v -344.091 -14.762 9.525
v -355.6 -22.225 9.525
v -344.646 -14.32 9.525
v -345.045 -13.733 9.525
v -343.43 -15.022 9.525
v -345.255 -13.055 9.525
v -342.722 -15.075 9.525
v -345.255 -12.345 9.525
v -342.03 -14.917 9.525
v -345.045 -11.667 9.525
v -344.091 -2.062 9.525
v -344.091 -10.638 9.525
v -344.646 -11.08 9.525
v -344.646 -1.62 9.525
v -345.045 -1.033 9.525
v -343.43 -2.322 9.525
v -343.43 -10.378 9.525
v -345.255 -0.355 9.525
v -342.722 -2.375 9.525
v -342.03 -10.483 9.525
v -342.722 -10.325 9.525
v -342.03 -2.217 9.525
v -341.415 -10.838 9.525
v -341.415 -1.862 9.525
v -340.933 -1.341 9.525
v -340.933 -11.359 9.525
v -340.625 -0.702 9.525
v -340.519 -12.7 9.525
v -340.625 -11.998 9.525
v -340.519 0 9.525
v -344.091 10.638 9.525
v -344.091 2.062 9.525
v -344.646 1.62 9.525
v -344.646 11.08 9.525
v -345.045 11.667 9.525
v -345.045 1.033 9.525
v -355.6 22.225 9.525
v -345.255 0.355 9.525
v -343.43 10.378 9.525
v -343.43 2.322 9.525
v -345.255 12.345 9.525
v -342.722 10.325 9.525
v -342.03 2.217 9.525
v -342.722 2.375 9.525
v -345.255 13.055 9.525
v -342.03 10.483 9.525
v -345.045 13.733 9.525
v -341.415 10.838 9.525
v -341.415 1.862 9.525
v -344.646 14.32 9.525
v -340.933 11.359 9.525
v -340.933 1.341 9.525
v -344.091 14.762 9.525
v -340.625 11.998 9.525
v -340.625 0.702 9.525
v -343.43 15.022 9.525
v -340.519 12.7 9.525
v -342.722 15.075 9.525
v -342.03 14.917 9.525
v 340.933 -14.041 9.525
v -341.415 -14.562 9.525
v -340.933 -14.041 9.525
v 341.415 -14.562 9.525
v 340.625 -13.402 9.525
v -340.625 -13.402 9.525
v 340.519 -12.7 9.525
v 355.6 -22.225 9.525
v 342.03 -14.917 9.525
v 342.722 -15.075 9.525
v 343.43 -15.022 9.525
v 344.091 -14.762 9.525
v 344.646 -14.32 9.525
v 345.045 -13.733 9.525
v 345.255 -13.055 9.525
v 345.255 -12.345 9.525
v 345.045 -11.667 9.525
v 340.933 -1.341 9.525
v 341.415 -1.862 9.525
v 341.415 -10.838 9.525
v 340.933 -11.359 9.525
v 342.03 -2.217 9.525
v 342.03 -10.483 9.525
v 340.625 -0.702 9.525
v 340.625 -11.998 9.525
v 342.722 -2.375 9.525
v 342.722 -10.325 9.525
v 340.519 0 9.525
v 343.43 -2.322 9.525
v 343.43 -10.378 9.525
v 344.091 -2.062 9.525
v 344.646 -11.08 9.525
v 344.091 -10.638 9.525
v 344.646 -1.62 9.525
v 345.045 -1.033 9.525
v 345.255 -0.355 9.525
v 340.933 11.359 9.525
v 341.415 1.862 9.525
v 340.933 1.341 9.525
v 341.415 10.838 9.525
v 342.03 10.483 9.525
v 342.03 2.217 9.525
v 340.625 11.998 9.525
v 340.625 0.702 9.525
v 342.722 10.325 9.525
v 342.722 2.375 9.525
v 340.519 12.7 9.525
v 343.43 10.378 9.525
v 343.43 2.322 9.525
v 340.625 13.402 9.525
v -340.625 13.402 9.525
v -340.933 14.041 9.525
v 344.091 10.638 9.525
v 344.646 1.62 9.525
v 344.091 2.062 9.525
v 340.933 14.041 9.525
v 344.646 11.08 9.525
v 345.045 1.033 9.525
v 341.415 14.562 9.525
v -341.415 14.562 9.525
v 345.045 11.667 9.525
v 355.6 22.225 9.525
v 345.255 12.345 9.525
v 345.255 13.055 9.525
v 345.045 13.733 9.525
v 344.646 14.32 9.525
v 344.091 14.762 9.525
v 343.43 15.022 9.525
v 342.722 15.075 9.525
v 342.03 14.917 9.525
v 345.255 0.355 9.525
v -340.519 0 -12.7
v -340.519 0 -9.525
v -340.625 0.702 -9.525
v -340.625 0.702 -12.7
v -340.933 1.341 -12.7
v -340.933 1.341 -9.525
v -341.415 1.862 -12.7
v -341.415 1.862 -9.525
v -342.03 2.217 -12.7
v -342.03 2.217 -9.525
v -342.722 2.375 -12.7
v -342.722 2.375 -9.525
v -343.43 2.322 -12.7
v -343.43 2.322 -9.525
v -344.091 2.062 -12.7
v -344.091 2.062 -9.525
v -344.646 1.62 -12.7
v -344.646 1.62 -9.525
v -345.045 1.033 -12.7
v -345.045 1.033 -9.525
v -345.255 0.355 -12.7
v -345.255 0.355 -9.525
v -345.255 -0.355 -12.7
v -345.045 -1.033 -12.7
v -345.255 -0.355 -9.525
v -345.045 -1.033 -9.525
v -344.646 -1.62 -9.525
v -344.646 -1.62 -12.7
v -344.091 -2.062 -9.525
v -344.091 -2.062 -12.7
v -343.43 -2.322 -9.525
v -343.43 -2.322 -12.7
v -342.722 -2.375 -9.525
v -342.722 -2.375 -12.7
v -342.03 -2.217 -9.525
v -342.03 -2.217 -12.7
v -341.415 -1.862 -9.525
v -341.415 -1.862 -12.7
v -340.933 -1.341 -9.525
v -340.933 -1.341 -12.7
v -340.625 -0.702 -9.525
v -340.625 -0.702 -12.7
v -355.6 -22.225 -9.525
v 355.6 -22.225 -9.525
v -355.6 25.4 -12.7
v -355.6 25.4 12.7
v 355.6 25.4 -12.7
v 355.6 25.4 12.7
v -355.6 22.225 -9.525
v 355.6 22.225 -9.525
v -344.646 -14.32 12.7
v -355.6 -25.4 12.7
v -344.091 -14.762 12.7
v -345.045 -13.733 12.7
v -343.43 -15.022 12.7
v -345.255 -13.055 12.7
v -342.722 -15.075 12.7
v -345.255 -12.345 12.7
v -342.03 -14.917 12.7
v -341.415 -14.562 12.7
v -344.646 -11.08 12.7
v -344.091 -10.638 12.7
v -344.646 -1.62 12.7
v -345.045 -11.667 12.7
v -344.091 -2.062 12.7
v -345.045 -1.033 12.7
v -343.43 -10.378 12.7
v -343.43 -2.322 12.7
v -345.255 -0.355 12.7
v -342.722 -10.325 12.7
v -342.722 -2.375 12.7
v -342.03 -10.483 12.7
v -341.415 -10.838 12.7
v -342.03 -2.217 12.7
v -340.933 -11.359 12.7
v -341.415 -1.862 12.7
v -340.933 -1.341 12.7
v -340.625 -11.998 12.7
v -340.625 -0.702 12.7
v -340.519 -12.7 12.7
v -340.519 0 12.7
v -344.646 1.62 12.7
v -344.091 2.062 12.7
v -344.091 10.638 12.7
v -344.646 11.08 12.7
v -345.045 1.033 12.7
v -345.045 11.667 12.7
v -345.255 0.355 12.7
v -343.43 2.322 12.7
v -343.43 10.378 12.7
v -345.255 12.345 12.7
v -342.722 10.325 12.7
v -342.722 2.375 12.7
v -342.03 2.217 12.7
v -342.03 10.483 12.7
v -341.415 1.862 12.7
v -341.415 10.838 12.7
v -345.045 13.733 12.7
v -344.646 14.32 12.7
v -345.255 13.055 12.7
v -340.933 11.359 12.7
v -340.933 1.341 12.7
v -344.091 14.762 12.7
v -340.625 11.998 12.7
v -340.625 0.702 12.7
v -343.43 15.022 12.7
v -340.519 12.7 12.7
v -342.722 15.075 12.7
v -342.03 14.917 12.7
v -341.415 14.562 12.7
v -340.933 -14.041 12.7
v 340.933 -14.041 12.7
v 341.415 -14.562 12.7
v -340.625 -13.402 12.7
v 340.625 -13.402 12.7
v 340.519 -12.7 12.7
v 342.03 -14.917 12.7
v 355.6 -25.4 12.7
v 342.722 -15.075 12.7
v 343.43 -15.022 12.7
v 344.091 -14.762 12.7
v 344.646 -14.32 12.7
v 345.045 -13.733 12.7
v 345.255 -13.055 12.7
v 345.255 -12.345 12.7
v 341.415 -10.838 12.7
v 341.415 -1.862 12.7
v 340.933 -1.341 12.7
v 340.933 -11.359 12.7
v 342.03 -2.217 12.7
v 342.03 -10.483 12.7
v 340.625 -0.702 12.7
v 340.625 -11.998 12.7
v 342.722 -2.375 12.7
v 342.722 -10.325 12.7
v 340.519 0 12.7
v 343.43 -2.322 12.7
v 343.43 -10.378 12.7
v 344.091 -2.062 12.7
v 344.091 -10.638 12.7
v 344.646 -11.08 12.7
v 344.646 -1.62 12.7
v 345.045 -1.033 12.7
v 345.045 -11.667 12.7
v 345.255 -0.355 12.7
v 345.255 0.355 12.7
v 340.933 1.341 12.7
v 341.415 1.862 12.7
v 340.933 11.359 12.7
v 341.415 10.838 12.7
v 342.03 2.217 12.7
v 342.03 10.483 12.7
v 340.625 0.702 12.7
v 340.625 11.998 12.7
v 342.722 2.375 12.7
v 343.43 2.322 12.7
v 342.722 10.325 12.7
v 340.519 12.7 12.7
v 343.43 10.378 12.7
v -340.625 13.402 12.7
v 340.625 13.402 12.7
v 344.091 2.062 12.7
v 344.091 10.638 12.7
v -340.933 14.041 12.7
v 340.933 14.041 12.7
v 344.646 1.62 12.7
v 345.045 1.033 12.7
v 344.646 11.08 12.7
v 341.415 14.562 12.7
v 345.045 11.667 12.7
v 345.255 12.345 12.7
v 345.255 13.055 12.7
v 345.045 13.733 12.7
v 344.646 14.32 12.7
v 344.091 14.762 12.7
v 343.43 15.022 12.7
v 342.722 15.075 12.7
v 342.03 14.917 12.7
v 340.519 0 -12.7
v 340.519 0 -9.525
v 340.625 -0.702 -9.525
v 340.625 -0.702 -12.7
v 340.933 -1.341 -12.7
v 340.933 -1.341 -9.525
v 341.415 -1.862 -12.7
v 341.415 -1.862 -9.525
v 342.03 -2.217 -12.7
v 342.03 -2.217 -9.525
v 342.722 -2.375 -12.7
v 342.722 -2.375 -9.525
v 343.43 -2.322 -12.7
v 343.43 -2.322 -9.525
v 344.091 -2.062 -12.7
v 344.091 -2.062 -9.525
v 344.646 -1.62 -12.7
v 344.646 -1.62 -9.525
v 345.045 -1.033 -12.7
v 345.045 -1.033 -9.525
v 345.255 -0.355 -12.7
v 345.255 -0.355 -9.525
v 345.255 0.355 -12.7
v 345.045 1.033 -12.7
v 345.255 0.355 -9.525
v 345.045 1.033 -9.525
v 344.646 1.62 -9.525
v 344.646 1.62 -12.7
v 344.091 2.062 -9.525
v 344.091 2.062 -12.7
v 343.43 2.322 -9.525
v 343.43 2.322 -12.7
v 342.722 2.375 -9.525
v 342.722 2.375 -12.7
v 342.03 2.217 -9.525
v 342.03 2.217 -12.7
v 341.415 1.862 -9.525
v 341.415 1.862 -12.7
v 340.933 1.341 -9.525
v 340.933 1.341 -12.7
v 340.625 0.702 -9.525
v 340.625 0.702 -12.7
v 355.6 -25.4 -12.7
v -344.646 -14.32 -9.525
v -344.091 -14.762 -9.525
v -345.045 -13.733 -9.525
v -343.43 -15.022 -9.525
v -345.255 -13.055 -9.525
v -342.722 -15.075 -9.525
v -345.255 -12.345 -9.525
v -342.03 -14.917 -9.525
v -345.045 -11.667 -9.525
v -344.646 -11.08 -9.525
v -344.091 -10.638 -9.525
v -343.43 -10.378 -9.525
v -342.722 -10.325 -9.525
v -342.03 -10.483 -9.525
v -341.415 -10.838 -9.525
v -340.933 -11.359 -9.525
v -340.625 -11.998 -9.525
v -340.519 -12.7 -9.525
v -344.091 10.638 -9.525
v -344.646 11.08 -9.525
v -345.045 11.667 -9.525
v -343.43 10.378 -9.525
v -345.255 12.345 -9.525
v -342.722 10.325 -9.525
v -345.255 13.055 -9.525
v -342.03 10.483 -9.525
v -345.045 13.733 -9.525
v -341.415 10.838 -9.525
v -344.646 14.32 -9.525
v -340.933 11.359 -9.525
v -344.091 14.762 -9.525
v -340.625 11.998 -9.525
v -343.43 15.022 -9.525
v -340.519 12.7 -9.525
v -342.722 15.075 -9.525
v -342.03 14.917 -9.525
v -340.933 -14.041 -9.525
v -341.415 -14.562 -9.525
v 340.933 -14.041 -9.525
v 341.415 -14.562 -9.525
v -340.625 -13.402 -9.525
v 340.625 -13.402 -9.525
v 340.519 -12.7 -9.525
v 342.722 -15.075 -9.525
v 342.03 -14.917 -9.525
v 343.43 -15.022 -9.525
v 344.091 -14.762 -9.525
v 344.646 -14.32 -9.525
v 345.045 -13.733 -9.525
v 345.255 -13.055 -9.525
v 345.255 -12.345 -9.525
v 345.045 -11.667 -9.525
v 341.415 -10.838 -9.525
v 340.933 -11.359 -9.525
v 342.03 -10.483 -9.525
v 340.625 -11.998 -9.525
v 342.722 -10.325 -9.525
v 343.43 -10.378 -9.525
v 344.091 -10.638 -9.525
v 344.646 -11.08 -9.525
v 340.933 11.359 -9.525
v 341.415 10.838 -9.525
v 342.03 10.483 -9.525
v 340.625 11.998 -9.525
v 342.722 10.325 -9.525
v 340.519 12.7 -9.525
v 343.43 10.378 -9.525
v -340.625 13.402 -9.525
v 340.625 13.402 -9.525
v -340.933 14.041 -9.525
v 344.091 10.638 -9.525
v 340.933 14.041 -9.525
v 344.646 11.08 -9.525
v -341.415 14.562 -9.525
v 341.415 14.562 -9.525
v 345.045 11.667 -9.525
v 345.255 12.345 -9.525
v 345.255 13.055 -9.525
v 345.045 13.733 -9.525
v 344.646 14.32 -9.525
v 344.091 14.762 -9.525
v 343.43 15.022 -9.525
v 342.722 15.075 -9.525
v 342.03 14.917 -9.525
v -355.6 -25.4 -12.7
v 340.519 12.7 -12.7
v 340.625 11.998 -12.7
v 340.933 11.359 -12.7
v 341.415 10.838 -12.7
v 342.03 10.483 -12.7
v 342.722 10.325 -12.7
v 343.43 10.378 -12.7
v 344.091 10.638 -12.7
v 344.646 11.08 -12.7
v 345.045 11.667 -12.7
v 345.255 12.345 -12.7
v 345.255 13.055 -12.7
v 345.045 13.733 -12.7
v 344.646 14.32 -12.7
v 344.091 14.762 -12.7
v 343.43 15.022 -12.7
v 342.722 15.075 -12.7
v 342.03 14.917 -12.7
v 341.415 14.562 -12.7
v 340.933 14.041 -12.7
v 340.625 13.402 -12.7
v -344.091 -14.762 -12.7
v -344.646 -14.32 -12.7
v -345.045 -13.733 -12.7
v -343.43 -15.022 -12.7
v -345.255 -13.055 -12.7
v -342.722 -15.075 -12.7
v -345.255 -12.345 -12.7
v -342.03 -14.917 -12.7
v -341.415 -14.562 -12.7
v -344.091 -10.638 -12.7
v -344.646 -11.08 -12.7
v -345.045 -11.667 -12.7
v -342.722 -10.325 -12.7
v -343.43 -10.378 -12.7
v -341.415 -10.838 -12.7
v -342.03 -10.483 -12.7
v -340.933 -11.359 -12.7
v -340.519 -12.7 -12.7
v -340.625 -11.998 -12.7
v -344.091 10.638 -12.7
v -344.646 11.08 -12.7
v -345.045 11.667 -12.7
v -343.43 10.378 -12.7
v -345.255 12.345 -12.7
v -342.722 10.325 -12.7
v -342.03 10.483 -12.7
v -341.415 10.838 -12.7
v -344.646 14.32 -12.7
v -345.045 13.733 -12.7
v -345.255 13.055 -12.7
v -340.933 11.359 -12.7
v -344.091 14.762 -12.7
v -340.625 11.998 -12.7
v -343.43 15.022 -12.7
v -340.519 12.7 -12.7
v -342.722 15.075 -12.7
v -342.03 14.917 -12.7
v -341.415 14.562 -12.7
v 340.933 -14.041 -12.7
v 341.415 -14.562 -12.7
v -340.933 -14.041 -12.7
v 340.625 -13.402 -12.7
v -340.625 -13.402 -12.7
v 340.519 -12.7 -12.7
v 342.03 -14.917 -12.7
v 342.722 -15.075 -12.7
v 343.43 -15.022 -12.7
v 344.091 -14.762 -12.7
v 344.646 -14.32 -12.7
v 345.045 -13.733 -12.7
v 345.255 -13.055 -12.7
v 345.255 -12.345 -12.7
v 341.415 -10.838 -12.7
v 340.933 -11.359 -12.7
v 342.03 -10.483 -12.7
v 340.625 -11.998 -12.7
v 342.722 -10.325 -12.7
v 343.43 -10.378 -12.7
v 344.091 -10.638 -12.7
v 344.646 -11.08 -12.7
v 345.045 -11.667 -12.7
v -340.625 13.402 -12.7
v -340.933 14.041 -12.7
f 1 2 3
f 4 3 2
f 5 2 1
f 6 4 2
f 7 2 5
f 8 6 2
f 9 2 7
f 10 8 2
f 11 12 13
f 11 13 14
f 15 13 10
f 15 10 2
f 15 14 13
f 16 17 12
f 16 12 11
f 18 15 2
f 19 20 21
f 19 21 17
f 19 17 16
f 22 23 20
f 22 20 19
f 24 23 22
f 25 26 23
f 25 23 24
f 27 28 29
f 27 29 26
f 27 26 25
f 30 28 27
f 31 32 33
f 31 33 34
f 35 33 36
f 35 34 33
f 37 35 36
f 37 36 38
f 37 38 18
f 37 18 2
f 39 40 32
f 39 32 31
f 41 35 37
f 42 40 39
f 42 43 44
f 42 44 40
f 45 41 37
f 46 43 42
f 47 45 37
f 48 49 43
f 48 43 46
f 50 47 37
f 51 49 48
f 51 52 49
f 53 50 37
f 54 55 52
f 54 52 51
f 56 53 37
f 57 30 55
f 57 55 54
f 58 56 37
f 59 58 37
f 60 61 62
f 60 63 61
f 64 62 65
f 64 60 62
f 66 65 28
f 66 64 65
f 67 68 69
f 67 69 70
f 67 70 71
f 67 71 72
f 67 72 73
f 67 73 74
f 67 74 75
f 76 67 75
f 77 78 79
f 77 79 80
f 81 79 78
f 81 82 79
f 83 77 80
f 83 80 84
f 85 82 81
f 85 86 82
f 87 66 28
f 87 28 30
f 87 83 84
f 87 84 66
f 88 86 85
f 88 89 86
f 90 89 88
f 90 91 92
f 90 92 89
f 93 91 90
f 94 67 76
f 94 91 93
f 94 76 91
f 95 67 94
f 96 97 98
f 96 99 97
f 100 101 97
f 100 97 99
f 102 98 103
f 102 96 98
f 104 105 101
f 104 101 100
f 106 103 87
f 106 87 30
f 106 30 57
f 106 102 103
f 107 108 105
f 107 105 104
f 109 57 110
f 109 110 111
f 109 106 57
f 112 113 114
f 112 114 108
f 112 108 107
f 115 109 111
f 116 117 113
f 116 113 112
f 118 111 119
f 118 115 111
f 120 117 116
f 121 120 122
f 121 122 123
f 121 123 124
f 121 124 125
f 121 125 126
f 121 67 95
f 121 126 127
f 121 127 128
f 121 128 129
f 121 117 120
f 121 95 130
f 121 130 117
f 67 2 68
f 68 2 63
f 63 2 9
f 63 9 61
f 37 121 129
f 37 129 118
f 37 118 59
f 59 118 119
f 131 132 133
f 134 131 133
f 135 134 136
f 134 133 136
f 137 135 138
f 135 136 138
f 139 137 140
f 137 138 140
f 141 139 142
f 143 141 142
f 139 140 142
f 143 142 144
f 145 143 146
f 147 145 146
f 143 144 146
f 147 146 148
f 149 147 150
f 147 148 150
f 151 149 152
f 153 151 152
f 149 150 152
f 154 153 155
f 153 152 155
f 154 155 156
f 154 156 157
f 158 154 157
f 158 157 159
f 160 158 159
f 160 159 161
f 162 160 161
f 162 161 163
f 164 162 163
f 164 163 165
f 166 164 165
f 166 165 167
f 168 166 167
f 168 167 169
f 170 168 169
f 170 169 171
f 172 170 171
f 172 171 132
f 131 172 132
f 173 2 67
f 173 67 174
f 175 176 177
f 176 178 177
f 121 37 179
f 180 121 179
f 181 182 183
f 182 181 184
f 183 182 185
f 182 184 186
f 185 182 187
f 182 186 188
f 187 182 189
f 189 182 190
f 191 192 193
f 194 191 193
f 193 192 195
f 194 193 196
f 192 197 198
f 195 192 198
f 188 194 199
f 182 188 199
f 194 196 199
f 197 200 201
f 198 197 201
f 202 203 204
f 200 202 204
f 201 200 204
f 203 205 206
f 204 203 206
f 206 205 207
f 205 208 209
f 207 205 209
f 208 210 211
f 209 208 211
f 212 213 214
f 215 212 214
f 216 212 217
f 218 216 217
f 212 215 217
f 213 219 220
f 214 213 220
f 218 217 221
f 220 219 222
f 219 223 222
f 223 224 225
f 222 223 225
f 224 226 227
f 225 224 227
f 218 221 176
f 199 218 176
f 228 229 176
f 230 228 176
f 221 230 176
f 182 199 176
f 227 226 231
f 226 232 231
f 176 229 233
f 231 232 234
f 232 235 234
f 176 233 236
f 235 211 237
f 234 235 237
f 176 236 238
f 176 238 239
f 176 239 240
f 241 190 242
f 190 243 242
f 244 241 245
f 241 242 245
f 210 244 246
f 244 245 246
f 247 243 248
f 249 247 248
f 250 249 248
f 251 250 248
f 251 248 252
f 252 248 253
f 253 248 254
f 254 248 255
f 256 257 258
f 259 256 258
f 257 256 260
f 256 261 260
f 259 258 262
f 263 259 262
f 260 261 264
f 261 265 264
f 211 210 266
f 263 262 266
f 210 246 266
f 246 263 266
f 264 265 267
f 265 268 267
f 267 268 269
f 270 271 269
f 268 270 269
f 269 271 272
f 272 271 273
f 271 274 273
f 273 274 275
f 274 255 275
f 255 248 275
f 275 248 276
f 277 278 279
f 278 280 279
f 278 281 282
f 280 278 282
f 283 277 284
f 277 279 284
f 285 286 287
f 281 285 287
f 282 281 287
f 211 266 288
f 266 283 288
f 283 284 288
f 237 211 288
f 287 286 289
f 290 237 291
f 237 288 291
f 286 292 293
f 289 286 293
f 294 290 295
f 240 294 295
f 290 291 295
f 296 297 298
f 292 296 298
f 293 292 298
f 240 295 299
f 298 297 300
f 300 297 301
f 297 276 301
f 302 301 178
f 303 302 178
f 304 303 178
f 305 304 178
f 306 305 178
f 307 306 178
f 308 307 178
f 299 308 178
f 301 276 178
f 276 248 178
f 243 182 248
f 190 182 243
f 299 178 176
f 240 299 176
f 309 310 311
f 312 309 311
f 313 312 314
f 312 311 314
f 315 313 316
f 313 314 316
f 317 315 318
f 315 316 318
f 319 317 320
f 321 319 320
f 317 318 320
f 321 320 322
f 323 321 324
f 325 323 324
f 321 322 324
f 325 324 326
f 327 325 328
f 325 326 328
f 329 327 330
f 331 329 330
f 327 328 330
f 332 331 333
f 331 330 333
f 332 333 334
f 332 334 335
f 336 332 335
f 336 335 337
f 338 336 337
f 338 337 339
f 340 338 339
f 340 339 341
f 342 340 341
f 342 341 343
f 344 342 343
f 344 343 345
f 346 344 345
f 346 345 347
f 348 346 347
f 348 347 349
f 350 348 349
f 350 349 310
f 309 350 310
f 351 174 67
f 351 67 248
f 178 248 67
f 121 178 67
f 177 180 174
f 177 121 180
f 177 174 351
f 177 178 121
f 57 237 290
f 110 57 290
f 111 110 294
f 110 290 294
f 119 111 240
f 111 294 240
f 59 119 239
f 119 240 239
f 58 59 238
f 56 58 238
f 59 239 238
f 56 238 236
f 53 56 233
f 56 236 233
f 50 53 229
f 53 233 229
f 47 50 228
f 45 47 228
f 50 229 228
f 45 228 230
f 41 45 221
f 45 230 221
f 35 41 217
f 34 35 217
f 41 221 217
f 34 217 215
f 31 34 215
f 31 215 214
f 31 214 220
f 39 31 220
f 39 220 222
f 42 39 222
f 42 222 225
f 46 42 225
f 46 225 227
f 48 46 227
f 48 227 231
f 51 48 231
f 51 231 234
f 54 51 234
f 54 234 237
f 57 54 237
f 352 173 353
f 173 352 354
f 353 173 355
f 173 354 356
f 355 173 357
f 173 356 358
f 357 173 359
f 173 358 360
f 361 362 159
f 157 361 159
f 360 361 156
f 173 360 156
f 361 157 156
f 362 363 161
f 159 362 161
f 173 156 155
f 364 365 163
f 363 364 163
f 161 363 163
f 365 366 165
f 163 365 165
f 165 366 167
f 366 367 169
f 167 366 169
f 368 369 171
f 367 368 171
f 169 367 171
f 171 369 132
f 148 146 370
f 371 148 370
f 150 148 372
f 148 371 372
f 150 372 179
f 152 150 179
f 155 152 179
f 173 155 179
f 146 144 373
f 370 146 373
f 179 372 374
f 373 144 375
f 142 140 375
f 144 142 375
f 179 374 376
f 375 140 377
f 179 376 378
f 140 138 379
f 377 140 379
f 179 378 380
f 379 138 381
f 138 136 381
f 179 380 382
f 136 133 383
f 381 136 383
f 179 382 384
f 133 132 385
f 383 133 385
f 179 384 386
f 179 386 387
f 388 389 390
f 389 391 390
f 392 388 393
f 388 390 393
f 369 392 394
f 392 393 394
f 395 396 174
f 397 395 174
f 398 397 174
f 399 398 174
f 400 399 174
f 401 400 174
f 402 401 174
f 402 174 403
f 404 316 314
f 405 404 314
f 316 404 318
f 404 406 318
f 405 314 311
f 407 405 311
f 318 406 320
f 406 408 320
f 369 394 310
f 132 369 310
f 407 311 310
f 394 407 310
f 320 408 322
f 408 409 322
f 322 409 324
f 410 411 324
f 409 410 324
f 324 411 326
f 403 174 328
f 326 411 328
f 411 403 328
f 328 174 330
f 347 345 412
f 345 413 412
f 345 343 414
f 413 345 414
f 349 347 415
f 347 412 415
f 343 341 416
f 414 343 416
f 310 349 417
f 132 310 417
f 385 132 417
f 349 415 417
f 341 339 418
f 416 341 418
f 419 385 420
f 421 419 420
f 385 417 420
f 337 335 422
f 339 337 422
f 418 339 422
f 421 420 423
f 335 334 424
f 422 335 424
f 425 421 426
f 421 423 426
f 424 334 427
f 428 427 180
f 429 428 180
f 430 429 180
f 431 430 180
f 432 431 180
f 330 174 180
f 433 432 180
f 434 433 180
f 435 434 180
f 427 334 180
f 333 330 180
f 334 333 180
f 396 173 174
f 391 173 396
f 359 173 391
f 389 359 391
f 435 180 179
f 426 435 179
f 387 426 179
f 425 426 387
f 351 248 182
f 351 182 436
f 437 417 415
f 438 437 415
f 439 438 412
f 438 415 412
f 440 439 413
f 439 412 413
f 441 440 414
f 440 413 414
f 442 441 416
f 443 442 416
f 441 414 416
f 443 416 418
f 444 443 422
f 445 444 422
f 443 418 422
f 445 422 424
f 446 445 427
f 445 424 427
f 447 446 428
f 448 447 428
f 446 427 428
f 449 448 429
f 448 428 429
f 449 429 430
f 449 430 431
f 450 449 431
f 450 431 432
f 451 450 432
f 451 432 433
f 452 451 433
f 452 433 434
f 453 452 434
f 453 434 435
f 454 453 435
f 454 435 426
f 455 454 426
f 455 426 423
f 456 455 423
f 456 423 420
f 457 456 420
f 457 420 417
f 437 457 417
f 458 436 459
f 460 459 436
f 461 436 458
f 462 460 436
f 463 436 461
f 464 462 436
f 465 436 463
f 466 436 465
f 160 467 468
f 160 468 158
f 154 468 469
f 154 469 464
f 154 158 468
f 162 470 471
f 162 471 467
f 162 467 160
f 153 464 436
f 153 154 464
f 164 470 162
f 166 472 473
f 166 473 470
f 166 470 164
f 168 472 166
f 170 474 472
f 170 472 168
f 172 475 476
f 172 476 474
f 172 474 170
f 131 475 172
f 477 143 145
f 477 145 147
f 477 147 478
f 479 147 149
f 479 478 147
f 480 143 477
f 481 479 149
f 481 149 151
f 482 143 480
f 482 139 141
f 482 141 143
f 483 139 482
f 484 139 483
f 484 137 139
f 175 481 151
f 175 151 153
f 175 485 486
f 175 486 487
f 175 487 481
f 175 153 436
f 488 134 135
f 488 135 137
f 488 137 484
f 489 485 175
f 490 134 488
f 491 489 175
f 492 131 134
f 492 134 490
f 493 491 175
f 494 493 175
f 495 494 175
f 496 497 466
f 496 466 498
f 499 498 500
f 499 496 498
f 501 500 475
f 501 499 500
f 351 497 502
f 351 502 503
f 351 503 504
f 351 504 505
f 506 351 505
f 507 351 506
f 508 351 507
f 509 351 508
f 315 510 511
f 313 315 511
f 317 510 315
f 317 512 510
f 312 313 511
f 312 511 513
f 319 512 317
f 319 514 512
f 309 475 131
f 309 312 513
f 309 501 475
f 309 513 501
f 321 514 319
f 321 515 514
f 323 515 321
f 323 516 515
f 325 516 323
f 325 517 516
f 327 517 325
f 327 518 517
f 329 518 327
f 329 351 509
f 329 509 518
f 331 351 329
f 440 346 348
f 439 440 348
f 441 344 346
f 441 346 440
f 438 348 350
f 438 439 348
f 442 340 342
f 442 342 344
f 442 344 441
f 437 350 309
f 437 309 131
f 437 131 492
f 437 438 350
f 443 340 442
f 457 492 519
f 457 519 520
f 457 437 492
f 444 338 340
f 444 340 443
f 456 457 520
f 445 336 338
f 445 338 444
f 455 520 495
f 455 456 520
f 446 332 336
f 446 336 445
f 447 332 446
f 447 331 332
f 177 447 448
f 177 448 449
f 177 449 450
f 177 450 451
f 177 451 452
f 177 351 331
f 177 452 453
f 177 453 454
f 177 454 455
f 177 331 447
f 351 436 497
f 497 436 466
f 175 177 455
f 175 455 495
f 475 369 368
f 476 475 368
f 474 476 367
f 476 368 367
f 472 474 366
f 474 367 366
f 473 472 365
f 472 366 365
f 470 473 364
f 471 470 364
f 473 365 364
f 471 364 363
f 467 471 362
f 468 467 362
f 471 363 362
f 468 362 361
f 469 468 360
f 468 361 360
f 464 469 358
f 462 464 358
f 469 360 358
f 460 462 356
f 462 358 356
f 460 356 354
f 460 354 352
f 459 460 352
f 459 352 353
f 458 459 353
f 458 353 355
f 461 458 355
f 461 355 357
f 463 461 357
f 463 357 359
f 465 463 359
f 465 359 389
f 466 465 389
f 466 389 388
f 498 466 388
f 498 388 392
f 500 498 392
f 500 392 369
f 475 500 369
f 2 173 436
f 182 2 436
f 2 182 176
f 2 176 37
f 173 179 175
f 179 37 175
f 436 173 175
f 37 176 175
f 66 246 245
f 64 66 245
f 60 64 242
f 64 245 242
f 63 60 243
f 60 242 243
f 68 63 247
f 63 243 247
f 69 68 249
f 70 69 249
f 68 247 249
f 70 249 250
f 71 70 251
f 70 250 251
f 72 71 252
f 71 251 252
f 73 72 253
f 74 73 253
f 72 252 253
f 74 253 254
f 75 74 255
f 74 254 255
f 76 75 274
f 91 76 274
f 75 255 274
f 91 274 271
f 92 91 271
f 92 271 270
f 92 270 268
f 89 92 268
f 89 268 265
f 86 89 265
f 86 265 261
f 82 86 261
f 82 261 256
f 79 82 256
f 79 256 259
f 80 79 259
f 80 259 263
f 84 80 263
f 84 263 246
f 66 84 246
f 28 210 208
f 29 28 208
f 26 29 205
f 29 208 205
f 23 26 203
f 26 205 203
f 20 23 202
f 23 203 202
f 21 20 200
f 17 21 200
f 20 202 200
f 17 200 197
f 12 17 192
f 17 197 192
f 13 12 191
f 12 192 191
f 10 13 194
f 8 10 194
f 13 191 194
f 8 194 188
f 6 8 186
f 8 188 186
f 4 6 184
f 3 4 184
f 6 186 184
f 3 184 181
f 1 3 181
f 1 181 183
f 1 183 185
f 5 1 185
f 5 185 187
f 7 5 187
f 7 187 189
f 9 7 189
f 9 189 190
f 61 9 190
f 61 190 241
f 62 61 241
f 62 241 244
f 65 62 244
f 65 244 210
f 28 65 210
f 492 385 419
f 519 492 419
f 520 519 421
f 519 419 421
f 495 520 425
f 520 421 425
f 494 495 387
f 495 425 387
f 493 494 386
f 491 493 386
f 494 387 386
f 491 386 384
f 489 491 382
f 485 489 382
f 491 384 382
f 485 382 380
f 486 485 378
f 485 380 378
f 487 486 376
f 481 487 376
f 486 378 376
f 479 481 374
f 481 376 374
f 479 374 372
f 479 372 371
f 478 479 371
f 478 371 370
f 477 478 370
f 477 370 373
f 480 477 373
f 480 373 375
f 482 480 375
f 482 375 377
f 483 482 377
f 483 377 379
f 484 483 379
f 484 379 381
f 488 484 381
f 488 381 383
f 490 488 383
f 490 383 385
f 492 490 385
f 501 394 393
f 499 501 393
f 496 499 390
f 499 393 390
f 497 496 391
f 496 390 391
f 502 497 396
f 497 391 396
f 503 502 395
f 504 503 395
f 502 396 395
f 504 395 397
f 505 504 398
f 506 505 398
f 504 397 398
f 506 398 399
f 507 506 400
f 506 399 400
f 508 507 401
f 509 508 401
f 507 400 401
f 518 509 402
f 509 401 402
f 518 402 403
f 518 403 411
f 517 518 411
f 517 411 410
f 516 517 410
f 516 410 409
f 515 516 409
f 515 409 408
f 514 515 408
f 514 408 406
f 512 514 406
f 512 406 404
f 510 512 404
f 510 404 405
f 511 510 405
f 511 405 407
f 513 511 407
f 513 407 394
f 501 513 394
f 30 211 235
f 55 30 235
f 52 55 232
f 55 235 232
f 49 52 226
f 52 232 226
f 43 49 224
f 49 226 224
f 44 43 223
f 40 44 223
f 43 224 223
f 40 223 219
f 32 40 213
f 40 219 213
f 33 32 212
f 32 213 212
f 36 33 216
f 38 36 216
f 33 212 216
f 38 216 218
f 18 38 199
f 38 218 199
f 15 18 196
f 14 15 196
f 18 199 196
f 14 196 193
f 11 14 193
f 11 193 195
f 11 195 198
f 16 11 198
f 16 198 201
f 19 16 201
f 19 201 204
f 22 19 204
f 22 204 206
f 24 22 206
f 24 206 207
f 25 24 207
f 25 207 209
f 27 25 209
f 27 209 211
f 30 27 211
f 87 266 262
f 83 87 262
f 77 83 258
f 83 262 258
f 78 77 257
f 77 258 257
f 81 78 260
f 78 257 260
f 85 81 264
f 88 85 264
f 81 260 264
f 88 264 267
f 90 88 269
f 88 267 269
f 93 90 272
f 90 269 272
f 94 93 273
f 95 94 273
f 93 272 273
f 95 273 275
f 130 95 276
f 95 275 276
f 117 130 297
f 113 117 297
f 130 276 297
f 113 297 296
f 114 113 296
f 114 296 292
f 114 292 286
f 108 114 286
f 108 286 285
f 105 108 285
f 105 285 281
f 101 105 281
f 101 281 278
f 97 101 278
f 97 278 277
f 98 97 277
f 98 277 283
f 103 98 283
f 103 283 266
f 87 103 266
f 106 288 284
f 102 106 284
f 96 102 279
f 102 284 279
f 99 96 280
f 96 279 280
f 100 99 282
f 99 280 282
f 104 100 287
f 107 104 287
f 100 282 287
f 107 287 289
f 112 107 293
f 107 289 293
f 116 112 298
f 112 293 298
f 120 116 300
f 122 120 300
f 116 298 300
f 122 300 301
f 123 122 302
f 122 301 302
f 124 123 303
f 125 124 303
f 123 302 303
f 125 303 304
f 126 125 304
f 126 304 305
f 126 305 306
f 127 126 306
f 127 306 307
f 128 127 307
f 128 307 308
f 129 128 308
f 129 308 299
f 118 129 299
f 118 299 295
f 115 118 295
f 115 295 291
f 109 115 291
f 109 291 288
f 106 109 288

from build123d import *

# Parameters (mm, degrees)
SKETCH1_W           = 25.4
SKETCH1_H           = 50.8
BOSS_EXTRUDE1_DEPTH = 355.6
SHELL1_T            = -3.175
SKETCH2_R           = 2.38125
CUT_EXTRUDE1_DEPTH  = 358.409680899


with BuildPart() as part:
    # Sketch1 → Boss-Extrude1 (new, symmetric)
    with BuildSketch(Plane(origin=(0, 0, 0), x_dir=(0, 0, -1), z_dir=(1, 0, 0))):
        Rectangle(SKETCH1_W, SKETCH1_H)
    extrude(amount=BOSS_EXTRUDE1_DEPTH, both=True)

    # Shell1
    shell1_openings = [part.faces().sort_by_distance(p)[0] for p in [
        (355.6, 0, 0),
        (-355.6, 0, 0),
    ]]
    offset(amount=SHELL1_T, openings=shell1_openings, kind=Kind.INTERSECTION)

    # Sketch2 → Cut-Extrude1 (cut, through all)
    with BuildSketch(Plane.XY.offset(12.7)):
        with Locations((-342.9, 12.7)):
            Circle(SKETCH2_R)
        with Locations((-342.9, 0)):
            Circle(SKETCH2_R)
        with Locations((-342.9, -12.7)):
            Circle(SKETCH2_R)
        with Locations(Location((342.9, -12.7, 0), (0, 0, 180))):
            Circle(SKETCH2_R)
        with Locations(Location((342.9, 0, 0), (0, 0, 180))):
            Circle(SKETCH2_R)
        with Locations(Location((342.9, 12.7, 0), (0, 0, 180))):
            Circle(SKETCH2_R)
    extrude(amount=-CUT_EXTRUDE1_DEPTH, mode=Mode.SUBTRACT)


solid = part.part
